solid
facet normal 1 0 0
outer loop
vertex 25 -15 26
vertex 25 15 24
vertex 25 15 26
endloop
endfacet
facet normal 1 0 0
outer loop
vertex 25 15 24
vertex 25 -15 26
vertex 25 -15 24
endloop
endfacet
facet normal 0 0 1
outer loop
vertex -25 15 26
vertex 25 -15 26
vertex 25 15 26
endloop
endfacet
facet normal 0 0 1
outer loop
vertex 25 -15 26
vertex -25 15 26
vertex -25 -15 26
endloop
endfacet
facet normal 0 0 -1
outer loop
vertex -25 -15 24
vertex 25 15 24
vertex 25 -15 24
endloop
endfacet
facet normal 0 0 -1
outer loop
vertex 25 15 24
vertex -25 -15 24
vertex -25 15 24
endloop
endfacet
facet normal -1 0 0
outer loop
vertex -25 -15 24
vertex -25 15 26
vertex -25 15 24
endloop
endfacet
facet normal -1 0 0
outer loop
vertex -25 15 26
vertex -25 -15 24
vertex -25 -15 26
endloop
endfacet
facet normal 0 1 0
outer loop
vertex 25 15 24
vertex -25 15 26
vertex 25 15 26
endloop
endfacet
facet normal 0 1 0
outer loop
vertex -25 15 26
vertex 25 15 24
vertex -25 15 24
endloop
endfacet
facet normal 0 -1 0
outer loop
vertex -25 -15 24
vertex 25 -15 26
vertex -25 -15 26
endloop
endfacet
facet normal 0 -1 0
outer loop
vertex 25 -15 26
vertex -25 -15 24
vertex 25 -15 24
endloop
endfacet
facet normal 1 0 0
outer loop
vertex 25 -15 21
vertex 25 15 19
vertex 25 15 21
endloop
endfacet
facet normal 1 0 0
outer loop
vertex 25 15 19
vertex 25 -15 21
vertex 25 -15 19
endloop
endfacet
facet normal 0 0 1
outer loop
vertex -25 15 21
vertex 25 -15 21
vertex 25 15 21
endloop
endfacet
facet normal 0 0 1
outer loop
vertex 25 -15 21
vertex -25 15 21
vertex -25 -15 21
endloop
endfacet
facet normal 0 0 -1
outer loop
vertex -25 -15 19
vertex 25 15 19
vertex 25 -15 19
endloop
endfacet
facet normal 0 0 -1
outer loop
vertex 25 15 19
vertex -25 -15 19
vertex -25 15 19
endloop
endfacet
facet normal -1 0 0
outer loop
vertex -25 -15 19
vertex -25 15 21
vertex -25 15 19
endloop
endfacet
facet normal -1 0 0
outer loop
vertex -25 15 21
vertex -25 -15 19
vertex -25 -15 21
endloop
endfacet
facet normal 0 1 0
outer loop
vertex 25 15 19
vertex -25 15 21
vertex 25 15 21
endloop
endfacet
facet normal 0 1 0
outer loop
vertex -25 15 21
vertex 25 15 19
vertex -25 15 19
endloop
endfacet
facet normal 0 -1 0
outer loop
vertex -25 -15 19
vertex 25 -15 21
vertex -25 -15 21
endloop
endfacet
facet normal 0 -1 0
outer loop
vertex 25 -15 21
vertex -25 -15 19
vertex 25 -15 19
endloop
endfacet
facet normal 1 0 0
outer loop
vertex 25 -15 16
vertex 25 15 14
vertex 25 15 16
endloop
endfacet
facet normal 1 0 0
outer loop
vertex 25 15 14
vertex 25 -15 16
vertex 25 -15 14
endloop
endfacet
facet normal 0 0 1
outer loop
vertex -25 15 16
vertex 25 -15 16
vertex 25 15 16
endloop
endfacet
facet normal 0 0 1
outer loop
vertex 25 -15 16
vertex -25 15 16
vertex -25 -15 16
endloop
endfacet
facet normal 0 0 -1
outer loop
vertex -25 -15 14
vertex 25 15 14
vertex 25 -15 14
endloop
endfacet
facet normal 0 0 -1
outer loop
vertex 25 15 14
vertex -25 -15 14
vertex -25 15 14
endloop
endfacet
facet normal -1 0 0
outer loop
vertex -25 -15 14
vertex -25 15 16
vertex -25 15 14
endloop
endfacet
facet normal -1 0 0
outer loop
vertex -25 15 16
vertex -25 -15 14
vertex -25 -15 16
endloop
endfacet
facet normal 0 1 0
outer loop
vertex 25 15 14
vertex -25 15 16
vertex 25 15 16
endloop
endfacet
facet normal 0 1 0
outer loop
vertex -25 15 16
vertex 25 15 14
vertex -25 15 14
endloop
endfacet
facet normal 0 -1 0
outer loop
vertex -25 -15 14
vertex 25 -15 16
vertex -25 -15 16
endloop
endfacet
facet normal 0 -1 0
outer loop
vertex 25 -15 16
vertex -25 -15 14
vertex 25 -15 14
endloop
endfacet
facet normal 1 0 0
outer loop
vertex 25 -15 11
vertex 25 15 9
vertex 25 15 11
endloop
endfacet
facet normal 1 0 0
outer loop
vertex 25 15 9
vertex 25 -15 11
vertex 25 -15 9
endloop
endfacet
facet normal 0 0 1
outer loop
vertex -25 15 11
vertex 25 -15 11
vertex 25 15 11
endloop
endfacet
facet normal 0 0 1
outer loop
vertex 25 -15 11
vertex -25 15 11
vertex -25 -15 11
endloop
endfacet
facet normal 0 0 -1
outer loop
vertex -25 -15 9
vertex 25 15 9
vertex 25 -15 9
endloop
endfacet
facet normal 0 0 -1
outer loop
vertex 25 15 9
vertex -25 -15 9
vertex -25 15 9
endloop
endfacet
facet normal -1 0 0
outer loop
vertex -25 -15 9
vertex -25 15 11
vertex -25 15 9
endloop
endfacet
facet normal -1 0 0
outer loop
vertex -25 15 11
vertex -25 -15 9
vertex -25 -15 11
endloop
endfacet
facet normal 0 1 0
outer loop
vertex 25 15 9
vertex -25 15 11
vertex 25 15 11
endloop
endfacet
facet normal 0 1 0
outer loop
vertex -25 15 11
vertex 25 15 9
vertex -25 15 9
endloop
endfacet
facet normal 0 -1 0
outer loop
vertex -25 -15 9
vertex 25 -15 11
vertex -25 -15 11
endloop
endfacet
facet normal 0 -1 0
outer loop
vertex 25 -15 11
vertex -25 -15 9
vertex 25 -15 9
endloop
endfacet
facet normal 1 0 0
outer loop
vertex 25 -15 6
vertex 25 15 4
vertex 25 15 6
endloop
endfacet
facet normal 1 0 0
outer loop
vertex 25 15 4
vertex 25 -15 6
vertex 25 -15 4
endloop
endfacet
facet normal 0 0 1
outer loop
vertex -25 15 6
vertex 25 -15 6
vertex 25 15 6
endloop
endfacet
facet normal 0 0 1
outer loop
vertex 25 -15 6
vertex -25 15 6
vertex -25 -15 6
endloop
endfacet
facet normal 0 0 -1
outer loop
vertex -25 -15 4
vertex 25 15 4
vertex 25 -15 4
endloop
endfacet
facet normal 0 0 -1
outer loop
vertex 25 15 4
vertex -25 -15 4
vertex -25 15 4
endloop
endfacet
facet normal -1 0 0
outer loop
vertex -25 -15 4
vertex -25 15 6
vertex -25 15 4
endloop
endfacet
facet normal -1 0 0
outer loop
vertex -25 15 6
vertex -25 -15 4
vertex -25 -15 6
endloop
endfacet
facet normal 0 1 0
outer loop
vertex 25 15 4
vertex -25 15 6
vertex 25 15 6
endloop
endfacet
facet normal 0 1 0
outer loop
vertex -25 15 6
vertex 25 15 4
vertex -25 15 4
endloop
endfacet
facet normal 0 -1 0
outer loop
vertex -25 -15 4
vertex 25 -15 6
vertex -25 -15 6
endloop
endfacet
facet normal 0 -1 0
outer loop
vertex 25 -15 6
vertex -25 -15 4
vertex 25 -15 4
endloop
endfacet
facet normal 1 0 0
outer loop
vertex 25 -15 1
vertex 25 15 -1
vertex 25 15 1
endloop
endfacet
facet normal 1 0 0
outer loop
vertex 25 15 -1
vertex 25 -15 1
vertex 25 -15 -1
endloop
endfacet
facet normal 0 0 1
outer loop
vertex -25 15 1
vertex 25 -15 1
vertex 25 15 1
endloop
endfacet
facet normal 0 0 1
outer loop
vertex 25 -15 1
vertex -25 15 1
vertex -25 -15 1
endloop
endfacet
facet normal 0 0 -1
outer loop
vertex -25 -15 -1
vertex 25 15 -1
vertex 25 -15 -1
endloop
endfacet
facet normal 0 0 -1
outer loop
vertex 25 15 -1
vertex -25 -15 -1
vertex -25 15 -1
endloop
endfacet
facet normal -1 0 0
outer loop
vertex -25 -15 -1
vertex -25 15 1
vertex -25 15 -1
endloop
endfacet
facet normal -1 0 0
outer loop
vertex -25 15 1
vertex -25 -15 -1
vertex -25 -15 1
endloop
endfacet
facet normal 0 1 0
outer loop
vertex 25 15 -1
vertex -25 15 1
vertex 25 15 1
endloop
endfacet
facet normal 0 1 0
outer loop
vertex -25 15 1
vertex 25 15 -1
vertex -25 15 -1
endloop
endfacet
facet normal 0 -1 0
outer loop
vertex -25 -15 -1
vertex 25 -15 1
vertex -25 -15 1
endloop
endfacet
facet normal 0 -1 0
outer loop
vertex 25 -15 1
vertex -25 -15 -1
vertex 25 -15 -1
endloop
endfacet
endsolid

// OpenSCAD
// Parameters for the rectangular plate
plate_length = 50;  // Length of the plate
plate_width = 30;   // Width of the plate
plate_thickness = 2; // Thickness of the plate
layer_spacing = 5;  // Spacing between layers

// Function to create a rectangular plate
module rectangular_plate() {
    cube([plate_length, plate_width, plate_thickness], center = true);
}

// Generate the stack of rectangular plates
translate([0, 0, layer_spacing * 5]) rectangular_plate(); // Layer 1 (topmost)
translate([0, 0, layer_spacing * 4]) rectangular_plate(); // Layer 2
translate([0, 0, layer_spacing * 3]) rectangular_plate(); // Layer 3
translate([0, 0, layer_spacing * 2]) rectangular_plate(); // Layer 4
translate([0, 0, layer_spacing * 1]) rectangular_plate(); // Layer 5
translate([0, 0, layer_spacing * 0]) rectangular_plate(); // Layer 6 (bottommost)
